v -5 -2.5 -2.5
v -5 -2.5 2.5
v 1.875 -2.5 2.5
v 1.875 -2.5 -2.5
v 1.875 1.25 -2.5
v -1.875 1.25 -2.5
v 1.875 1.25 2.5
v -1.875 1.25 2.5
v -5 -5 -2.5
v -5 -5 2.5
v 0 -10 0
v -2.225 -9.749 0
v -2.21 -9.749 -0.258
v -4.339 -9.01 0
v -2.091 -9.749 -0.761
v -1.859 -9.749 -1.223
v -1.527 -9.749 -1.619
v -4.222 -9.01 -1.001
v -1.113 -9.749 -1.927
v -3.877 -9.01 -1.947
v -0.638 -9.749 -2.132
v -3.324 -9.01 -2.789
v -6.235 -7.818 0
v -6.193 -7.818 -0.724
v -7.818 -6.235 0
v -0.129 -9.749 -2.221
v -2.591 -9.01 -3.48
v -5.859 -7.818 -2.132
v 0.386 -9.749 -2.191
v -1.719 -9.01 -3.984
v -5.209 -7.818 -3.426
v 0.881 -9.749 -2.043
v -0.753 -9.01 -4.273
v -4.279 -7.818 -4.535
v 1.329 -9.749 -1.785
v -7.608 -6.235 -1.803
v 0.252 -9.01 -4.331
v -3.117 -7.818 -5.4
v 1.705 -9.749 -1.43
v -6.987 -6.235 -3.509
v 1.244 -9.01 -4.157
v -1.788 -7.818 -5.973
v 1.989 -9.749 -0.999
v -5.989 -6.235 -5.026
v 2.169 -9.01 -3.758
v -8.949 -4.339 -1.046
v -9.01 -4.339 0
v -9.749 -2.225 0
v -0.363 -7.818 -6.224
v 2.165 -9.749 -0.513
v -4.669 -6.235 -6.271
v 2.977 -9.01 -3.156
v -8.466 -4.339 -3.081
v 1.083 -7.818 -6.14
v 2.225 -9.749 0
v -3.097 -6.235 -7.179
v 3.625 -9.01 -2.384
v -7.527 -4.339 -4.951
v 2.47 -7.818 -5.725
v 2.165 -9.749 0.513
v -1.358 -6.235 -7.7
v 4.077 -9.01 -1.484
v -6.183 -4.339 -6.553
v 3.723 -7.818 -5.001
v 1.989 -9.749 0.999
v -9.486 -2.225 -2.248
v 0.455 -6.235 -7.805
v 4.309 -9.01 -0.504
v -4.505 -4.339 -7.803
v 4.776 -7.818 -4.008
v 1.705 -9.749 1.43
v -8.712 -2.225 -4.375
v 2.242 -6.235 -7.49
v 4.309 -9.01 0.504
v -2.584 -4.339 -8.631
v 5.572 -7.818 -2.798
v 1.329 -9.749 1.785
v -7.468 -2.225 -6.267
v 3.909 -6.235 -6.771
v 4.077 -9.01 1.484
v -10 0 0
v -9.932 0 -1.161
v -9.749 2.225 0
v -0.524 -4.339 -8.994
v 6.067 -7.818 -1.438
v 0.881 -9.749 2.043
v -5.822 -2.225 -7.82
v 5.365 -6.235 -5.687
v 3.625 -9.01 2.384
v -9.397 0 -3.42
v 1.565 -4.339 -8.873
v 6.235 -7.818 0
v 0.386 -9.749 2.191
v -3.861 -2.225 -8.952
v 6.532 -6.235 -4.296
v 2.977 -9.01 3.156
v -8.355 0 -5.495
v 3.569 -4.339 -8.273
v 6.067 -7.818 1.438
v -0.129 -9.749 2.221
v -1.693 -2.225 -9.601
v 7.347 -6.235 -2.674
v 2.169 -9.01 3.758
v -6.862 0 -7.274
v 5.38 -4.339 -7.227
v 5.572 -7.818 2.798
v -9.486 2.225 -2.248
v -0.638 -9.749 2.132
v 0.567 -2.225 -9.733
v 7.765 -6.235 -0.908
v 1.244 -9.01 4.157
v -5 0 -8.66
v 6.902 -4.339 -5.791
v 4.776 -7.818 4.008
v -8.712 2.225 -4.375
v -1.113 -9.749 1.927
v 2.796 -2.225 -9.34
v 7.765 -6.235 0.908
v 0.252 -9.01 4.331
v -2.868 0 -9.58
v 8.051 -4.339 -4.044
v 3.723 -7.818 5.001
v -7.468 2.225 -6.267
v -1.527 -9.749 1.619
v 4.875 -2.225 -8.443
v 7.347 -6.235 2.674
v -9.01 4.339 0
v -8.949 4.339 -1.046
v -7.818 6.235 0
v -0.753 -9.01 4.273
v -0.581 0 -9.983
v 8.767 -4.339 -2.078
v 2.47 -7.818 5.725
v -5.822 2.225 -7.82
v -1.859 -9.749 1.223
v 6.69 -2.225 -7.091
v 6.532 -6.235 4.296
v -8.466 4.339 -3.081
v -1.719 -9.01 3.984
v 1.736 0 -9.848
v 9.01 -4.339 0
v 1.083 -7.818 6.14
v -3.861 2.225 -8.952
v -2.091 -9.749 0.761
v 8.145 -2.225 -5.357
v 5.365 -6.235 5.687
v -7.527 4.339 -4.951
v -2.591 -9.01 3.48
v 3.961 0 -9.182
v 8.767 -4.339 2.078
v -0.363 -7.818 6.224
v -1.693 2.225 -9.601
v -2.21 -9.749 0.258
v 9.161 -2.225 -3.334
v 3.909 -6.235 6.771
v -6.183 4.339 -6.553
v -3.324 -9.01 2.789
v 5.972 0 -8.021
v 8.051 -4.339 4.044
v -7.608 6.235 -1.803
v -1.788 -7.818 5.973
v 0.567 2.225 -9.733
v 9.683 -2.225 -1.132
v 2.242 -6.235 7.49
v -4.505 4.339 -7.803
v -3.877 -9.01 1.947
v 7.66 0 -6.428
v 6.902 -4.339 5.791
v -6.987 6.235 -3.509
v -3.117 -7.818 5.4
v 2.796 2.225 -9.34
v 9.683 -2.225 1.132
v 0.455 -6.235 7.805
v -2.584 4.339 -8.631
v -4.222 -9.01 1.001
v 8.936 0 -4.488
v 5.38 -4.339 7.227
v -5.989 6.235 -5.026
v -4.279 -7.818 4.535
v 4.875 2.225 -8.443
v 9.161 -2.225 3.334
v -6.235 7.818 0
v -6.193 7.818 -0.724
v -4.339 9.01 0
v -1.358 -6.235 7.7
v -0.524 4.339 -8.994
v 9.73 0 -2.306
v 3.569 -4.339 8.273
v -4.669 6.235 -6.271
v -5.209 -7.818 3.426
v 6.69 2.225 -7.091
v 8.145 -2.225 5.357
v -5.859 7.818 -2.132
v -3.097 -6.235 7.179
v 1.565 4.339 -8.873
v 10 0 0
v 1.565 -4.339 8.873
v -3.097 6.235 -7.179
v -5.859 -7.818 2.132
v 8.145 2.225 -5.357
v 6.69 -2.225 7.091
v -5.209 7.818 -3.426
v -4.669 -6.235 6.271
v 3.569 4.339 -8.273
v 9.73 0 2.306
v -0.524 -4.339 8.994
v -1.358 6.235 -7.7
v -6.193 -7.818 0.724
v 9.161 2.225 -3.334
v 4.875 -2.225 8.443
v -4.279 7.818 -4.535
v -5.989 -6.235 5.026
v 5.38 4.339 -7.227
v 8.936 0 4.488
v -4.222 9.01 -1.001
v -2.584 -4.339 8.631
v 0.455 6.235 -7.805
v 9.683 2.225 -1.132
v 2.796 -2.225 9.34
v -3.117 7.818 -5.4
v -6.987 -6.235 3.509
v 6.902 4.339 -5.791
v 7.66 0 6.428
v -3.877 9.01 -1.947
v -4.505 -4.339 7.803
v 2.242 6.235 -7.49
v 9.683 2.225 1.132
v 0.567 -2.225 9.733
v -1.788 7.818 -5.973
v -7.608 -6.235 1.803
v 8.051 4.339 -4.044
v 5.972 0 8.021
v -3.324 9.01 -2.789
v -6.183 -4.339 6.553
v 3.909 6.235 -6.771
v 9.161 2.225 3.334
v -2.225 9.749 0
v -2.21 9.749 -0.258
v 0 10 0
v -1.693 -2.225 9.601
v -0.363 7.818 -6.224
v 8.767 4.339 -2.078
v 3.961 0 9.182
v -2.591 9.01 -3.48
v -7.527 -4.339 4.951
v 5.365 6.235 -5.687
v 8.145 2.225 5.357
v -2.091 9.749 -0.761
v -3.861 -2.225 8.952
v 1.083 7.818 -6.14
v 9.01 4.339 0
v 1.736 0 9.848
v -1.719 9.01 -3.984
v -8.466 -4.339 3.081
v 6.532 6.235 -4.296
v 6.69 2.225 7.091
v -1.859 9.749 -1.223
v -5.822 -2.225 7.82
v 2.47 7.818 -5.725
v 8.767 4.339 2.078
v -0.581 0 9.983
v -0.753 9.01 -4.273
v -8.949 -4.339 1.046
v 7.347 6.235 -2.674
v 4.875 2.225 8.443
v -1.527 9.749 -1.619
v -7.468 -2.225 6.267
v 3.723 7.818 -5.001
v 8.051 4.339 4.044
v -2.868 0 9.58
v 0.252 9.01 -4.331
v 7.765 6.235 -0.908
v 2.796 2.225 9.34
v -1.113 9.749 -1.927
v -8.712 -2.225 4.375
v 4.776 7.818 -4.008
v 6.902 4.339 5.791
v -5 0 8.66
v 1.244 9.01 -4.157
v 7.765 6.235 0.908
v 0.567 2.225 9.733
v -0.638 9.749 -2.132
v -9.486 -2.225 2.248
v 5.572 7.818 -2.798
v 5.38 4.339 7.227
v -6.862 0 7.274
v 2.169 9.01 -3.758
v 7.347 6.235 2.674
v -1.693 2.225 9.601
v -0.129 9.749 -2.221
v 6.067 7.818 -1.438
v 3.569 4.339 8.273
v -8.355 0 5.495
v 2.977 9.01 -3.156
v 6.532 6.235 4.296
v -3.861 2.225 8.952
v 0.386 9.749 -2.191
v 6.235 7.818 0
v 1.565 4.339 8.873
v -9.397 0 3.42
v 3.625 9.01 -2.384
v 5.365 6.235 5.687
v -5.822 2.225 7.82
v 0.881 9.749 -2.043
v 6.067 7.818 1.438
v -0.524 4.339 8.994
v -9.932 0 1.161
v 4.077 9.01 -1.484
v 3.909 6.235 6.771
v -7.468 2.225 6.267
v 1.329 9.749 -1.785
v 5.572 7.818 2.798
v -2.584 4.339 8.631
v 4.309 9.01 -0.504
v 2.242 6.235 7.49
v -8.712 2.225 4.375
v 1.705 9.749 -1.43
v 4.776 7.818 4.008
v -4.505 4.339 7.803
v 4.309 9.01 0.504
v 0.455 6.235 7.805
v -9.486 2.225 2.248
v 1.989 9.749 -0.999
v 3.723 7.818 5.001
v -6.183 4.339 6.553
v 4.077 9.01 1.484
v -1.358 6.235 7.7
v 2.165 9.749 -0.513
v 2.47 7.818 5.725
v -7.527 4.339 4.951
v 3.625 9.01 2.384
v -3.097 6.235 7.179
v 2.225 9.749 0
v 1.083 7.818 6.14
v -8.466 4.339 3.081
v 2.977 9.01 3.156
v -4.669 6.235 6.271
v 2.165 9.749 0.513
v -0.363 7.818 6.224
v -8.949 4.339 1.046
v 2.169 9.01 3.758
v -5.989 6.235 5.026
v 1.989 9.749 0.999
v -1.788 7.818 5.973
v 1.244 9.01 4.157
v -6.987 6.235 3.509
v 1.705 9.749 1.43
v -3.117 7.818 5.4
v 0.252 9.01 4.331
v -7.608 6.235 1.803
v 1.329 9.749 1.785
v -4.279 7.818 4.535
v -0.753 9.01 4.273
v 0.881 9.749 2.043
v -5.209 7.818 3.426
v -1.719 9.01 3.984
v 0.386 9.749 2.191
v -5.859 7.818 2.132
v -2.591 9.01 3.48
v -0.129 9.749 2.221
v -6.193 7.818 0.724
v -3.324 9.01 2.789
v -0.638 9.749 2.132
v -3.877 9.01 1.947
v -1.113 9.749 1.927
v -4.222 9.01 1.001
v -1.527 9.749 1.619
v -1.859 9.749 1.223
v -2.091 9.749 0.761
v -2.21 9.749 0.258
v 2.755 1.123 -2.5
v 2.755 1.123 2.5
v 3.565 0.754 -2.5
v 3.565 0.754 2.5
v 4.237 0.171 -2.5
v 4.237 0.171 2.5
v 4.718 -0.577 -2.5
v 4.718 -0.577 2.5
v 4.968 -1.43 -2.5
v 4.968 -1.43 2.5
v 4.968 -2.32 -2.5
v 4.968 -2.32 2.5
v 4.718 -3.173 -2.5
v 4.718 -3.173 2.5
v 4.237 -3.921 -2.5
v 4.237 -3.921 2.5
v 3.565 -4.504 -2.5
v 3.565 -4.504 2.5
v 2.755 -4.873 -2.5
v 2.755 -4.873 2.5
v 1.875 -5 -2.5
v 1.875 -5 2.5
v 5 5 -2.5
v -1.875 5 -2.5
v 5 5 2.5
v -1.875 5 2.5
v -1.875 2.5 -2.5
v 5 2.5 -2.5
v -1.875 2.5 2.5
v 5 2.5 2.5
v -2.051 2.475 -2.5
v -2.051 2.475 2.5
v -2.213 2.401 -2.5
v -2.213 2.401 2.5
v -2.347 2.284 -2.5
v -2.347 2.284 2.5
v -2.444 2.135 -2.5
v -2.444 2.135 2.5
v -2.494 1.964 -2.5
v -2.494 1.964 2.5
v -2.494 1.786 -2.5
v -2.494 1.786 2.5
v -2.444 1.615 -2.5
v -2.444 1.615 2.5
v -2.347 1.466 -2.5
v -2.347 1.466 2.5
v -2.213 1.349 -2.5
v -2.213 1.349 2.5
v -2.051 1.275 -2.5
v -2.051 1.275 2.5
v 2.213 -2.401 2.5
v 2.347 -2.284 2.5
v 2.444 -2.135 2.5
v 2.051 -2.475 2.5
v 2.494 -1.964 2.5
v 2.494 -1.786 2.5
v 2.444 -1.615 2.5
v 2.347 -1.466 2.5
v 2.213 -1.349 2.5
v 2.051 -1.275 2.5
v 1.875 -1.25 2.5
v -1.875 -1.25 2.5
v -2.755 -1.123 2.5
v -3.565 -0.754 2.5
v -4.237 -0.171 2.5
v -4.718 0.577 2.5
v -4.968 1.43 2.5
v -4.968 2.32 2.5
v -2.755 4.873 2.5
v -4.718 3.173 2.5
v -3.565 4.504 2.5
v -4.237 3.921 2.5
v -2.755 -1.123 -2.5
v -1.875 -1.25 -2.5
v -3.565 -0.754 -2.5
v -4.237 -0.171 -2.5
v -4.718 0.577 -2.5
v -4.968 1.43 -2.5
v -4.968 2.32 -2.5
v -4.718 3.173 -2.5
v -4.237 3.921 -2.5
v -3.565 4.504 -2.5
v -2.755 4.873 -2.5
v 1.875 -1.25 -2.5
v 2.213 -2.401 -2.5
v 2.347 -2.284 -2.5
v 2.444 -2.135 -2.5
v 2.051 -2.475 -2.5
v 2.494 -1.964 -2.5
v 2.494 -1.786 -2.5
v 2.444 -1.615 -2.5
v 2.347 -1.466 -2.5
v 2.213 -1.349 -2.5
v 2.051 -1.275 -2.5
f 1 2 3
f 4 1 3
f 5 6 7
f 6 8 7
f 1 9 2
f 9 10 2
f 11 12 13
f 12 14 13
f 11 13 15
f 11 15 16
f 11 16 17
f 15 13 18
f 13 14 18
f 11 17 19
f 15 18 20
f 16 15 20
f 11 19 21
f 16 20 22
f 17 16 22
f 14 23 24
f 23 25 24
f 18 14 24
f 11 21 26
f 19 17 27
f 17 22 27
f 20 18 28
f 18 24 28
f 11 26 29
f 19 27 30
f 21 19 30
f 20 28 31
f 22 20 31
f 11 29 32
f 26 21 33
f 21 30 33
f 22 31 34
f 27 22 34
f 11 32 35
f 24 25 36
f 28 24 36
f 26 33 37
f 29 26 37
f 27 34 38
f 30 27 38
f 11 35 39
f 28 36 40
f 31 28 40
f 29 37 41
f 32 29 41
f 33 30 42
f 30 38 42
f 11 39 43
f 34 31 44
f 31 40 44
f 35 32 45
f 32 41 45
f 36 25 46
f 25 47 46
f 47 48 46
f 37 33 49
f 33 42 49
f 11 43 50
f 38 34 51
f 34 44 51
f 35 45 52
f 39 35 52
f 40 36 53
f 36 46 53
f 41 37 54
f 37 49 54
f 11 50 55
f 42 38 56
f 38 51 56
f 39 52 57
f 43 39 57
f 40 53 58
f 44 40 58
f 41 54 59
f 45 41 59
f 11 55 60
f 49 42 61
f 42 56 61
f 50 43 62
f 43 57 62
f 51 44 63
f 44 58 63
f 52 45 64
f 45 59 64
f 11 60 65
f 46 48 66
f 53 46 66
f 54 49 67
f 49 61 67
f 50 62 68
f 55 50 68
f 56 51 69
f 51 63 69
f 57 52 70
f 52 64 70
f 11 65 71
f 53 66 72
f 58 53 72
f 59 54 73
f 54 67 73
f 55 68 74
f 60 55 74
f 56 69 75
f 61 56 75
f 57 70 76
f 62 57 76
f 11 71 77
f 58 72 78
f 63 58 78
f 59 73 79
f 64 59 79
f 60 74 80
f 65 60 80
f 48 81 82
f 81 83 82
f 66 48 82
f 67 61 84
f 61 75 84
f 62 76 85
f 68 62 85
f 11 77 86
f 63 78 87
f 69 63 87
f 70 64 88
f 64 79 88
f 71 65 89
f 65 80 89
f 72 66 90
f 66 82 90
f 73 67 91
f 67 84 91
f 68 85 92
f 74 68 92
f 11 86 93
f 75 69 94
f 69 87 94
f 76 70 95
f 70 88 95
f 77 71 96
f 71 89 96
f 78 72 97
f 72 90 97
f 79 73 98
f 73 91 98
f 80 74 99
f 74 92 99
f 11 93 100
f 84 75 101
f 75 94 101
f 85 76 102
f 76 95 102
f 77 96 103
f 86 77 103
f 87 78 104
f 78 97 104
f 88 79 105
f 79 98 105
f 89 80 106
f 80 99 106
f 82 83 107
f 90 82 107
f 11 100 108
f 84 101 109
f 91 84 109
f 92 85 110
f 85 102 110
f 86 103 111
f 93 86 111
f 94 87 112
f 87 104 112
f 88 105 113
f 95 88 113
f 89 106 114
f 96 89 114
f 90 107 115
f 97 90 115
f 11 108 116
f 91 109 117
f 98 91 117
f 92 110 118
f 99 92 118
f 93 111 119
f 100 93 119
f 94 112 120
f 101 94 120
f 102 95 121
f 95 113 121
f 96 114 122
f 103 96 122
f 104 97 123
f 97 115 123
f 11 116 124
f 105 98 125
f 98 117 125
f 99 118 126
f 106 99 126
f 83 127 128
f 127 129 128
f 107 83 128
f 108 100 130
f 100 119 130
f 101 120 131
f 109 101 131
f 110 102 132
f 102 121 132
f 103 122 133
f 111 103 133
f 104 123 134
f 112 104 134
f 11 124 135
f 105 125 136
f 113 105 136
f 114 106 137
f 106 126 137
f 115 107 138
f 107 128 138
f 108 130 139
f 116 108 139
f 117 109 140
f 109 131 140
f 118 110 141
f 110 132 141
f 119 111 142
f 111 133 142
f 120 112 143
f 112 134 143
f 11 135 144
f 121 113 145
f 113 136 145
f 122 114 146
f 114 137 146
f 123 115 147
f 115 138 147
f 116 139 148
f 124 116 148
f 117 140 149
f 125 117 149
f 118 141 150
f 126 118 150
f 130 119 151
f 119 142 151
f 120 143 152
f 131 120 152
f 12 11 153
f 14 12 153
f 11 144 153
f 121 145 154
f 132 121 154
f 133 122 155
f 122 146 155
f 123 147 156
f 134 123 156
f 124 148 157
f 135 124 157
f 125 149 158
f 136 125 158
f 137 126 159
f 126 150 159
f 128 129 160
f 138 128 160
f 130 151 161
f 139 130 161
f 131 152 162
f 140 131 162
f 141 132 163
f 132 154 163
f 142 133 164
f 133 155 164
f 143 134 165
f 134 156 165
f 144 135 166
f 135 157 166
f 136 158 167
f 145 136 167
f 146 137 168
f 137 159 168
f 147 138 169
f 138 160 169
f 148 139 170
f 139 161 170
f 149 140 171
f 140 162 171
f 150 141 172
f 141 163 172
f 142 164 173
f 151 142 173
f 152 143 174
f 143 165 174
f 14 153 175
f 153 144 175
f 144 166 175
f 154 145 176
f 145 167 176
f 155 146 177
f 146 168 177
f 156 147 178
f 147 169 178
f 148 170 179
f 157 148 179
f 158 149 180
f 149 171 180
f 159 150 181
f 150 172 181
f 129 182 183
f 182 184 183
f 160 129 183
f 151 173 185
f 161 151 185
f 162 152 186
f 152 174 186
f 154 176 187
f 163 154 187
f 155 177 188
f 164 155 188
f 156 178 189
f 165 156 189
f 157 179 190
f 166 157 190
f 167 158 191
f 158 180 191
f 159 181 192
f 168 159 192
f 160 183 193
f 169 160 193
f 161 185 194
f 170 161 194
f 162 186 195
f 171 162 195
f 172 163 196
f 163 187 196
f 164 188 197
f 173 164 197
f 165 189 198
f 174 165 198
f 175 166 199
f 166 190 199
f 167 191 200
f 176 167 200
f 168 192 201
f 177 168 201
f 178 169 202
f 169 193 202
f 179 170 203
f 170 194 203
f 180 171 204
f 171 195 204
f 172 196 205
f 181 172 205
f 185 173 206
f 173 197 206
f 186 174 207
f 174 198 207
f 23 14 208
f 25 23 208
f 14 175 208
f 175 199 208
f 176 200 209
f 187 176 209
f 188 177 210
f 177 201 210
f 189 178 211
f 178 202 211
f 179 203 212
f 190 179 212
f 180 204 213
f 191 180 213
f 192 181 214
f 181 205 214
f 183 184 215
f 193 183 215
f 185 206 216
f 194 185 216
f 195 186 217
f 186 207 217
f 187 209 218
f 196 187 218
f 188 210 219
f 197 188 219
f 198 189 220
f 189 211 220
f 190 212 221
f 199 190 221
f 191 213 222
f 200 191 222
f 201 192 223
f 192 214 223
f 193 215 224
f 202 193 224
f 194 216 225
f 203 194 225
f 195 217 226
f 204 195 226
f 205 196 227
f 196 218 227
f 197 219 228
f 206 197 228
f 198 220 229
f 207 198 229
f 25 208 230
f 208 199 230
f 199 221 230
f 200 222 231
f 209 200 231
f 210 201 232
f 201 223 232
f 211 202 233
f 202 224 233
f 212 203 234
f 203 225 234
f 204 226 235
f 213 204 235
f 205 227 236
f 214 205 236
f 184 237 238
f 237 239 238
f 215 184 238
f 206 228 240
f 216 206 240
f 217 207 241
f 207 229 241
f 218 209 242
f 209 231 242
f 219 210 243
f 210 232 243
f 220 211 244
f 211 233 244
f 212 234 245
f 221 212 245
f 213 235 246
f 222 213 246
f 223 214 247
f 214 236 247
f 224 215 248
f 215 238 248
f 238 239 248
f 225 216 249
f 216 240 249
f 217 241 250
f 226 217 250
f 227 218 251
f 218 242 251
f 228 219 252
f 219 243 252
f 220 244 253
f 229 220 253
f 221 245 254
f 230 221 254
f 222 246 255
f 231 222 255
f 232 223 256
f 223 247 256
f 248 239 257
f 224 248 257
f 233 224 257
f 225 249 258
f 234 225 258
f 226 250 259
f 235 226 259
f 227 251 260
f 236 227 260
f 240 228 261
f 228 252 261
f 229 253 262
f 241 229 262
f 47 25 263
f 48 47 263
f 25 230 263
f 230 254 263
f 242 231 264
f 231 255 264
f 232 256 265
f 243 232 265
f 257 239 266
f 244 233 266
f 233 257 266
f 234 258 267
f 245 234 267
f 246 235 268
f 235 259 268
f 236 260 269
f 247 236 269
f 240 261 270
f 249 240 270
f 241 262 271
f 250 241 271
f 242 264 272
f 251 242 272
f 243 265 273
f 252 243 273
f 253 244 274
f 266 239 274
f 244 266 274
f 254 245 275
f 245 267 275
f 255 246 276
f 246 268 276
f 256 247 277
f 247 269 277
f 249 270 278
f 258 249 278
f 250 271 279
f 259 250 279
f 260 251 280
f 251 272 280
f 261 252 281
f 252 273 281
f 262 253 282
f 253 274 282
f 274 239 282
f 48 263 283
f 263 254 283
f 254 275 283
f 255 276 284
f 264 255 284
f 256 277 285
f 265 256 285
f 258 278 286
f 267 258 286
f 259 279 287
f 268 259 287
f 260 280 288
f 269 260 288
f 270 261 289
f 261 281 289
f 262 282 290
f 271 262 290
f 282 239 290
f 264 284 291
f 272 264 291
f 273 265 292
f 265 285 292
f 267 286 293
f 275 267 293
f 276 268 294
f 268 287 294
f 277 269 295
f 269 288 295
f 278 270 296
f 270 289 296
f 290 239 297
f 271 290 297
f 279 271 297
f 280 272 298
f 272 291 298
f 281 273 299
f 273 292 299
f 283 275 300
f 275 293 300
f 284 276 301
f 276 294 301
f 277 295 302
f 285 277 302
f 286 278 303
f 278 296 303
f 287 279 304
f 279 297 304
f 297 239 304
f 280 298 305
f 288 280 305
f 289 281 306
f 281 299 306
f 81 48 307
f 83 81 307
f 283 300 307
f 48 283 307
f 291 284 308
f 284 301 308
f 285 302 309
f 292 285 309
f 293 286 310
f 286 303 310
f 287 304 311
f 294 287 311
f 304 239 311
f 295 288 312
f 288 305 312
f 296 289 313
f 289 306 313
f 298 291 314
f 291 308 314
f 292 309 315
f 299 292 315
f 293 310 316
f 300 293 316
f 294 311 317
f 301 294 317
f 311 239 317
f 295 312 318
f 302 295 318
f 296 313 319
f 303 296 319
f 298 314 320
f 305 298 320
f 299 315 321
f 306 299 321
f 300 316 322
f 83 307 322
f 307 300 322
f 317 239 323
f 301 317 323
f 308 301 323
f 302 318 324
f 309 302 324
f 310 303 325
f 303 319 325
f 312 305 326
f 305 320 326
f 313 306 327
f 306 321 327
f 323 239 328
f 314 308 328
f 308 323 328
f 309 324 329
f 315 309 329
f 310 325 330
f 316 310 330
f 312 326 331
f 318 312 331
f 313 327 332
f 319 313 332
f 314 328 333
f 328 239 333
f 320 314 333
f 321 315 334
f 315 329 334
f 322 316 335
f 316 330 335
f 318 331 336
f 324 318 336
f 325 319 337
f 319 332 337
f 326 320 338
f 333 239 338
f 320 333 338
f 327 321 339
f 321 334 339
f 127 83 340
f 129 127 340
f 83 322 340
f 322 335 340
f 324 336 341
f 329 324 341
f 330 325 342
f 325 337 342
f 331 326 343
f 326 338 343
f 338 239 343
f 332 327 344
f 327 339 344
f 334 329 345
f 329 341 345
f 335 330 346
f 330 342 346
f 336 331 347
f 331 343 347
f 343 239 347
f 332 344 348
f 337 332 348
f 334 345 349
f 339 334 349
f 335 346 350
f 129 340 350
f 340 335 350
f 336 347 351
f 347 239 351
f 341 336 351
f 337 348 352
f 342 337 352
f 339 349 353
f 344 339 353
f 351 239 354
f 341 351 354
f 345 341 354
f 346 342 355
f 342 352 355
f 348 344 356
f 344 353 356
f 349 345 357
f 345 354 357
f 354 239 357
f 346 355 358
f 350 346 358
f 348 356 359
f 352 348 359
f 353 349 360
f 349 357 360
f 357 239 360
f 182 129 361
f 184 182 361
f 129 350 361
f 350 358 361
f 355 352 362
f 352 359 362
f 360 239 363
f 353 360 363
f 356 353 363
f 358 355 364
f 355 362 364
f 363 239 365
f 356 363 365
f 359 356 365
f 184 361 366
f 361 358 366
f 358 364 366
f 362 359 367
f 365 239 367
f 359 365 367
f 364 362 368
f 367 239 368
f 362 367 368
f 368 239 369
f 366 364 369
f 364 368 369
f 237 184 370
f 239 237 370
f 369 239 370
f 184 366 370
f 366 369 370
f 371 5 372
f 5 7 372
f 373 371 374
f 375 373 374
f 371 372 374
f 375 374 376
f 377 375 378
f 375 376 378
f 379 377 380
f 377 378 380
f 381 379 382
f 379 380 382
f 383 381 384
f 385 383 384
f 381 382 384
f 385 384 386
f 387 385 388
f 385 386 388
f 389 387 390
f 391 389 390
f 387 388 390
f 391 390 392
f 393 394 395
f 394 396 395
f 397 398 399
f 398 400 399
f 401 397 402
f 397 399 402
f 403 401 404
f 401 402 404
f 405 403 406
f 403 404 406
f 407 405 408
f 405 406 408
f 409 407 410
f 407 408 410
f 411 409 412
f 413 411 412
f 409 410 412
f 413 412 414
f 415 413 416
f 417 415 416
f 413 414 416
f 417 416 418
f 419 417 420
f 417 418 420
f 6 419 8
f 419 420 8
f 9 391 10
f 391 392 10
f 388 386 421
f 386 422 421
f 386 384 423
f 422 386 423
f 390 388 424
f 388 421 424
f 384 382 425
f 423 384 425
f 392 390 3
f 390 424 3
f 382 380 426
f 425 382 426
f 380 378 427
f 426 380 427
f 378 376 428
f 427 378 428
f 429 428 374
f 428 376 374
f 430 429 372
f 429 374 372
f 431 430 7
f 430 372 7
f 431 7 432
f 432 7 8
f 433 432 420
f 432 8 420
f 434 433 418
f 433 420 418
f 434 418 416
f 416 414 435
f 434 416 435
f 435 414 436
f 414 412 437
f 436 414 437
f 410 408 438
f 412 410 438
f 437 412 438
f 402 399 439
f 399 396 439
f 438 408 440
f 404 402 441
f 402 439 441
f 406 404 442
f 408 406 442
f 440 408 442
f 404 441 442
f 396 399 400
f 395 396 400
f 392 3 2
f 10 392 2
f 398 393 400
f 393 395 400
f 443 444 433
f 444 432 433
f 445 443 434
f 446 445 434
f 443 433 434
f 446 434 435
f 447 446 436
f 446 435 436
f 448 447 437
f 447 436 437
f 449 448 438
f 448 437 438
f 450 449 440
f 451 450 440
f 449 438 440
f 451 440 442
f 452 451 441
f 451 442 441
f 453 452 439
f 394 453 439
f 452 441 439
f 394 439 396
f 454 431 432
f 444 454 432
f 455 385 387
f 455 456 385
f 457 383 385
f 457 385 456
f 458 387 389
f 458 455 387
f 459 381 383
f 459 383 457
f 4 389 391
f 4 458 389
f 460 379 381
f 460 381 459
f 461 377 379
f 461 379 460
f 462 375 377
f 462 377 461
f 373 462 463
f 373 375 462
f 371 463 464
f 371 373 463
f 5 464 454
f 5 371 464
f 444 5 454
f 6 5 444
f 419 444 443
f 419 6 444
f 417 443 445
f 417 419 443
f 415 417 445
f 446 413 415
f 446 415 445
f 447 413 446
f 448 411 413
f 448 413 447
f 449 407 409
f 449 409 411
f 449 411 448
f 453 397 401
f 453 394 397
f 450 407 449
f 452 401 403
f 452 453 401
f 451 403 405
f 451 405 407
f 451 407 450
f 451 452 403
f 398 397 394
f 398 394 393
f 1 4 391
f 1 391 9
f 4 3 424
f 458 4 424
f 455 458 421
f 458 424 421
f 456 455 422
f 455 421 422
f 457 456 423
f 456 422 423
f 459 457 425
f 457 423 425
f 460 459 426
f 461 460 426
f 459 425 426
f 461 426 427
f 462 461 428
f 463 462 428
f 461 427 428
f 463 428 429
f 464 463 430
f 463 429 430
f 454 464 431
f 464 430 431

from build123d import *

# Parameters (mm, degrees)
AUFSATZ_LINEAR_AUSTRAGEN1_DEPTH = 2.5


with BuildPart() as part:
    # Skizze1 → Aufsatz-Linear austragen1 (new body, symmetric)
    with BuildSketch(Plane.XY):
        with BuildLine():
            Line((1.875, -1.25), (0, -1.25))
            Line((0, -1.25), (-1.875, -1.25))
            ThreePointArc((-1.875, -1.25), (-5, 1.875), (-1.875, 5))
            Line((-1.875, 5), (5, 5))
            Line((5, 5), (5, 2.5))
            Line((5, 2.5), (-1.875, 2.5))
            ThreePointArc((-1.875, 2.5), (-2.5, 1.875), (-1.875, 1.25))
            Line((-1.875, 1.25), (0, 1.25))
            Line((0, 1.25), (1.875, 1.25))
            ThreePointArc((1.875, 1.25), (5, -1.875), (1.875, -5))
            Line((1.875, -5), (-5, -5))
            Line((-5, -5), (-5, -2.5))
            Line((-5, -2.5), (1.875, -2.5))
            ThreePointArc((1.875, -2.5), (2.5, -1.875), (1.875, -1.25))
        make_face()
    extrude(amount=AUFSATZ_LINEAR_AUSTRAGEN1_DEPTH, both=True)


with BuildPart() as body_2:
    # Skizze2 → Rotation1 (revolve)
    with BuildSketch(Plane.XY):
        with BuildLine():
            Line((0, 10), (0, -10))
            ThreePointArc((0, -10), (-10, 0), (0, 10))
        make_face()
    revolve(axis=Axis((0, 10, 0), (0, -1, 0)))


solid = Compound([part.part, body_2.part])
